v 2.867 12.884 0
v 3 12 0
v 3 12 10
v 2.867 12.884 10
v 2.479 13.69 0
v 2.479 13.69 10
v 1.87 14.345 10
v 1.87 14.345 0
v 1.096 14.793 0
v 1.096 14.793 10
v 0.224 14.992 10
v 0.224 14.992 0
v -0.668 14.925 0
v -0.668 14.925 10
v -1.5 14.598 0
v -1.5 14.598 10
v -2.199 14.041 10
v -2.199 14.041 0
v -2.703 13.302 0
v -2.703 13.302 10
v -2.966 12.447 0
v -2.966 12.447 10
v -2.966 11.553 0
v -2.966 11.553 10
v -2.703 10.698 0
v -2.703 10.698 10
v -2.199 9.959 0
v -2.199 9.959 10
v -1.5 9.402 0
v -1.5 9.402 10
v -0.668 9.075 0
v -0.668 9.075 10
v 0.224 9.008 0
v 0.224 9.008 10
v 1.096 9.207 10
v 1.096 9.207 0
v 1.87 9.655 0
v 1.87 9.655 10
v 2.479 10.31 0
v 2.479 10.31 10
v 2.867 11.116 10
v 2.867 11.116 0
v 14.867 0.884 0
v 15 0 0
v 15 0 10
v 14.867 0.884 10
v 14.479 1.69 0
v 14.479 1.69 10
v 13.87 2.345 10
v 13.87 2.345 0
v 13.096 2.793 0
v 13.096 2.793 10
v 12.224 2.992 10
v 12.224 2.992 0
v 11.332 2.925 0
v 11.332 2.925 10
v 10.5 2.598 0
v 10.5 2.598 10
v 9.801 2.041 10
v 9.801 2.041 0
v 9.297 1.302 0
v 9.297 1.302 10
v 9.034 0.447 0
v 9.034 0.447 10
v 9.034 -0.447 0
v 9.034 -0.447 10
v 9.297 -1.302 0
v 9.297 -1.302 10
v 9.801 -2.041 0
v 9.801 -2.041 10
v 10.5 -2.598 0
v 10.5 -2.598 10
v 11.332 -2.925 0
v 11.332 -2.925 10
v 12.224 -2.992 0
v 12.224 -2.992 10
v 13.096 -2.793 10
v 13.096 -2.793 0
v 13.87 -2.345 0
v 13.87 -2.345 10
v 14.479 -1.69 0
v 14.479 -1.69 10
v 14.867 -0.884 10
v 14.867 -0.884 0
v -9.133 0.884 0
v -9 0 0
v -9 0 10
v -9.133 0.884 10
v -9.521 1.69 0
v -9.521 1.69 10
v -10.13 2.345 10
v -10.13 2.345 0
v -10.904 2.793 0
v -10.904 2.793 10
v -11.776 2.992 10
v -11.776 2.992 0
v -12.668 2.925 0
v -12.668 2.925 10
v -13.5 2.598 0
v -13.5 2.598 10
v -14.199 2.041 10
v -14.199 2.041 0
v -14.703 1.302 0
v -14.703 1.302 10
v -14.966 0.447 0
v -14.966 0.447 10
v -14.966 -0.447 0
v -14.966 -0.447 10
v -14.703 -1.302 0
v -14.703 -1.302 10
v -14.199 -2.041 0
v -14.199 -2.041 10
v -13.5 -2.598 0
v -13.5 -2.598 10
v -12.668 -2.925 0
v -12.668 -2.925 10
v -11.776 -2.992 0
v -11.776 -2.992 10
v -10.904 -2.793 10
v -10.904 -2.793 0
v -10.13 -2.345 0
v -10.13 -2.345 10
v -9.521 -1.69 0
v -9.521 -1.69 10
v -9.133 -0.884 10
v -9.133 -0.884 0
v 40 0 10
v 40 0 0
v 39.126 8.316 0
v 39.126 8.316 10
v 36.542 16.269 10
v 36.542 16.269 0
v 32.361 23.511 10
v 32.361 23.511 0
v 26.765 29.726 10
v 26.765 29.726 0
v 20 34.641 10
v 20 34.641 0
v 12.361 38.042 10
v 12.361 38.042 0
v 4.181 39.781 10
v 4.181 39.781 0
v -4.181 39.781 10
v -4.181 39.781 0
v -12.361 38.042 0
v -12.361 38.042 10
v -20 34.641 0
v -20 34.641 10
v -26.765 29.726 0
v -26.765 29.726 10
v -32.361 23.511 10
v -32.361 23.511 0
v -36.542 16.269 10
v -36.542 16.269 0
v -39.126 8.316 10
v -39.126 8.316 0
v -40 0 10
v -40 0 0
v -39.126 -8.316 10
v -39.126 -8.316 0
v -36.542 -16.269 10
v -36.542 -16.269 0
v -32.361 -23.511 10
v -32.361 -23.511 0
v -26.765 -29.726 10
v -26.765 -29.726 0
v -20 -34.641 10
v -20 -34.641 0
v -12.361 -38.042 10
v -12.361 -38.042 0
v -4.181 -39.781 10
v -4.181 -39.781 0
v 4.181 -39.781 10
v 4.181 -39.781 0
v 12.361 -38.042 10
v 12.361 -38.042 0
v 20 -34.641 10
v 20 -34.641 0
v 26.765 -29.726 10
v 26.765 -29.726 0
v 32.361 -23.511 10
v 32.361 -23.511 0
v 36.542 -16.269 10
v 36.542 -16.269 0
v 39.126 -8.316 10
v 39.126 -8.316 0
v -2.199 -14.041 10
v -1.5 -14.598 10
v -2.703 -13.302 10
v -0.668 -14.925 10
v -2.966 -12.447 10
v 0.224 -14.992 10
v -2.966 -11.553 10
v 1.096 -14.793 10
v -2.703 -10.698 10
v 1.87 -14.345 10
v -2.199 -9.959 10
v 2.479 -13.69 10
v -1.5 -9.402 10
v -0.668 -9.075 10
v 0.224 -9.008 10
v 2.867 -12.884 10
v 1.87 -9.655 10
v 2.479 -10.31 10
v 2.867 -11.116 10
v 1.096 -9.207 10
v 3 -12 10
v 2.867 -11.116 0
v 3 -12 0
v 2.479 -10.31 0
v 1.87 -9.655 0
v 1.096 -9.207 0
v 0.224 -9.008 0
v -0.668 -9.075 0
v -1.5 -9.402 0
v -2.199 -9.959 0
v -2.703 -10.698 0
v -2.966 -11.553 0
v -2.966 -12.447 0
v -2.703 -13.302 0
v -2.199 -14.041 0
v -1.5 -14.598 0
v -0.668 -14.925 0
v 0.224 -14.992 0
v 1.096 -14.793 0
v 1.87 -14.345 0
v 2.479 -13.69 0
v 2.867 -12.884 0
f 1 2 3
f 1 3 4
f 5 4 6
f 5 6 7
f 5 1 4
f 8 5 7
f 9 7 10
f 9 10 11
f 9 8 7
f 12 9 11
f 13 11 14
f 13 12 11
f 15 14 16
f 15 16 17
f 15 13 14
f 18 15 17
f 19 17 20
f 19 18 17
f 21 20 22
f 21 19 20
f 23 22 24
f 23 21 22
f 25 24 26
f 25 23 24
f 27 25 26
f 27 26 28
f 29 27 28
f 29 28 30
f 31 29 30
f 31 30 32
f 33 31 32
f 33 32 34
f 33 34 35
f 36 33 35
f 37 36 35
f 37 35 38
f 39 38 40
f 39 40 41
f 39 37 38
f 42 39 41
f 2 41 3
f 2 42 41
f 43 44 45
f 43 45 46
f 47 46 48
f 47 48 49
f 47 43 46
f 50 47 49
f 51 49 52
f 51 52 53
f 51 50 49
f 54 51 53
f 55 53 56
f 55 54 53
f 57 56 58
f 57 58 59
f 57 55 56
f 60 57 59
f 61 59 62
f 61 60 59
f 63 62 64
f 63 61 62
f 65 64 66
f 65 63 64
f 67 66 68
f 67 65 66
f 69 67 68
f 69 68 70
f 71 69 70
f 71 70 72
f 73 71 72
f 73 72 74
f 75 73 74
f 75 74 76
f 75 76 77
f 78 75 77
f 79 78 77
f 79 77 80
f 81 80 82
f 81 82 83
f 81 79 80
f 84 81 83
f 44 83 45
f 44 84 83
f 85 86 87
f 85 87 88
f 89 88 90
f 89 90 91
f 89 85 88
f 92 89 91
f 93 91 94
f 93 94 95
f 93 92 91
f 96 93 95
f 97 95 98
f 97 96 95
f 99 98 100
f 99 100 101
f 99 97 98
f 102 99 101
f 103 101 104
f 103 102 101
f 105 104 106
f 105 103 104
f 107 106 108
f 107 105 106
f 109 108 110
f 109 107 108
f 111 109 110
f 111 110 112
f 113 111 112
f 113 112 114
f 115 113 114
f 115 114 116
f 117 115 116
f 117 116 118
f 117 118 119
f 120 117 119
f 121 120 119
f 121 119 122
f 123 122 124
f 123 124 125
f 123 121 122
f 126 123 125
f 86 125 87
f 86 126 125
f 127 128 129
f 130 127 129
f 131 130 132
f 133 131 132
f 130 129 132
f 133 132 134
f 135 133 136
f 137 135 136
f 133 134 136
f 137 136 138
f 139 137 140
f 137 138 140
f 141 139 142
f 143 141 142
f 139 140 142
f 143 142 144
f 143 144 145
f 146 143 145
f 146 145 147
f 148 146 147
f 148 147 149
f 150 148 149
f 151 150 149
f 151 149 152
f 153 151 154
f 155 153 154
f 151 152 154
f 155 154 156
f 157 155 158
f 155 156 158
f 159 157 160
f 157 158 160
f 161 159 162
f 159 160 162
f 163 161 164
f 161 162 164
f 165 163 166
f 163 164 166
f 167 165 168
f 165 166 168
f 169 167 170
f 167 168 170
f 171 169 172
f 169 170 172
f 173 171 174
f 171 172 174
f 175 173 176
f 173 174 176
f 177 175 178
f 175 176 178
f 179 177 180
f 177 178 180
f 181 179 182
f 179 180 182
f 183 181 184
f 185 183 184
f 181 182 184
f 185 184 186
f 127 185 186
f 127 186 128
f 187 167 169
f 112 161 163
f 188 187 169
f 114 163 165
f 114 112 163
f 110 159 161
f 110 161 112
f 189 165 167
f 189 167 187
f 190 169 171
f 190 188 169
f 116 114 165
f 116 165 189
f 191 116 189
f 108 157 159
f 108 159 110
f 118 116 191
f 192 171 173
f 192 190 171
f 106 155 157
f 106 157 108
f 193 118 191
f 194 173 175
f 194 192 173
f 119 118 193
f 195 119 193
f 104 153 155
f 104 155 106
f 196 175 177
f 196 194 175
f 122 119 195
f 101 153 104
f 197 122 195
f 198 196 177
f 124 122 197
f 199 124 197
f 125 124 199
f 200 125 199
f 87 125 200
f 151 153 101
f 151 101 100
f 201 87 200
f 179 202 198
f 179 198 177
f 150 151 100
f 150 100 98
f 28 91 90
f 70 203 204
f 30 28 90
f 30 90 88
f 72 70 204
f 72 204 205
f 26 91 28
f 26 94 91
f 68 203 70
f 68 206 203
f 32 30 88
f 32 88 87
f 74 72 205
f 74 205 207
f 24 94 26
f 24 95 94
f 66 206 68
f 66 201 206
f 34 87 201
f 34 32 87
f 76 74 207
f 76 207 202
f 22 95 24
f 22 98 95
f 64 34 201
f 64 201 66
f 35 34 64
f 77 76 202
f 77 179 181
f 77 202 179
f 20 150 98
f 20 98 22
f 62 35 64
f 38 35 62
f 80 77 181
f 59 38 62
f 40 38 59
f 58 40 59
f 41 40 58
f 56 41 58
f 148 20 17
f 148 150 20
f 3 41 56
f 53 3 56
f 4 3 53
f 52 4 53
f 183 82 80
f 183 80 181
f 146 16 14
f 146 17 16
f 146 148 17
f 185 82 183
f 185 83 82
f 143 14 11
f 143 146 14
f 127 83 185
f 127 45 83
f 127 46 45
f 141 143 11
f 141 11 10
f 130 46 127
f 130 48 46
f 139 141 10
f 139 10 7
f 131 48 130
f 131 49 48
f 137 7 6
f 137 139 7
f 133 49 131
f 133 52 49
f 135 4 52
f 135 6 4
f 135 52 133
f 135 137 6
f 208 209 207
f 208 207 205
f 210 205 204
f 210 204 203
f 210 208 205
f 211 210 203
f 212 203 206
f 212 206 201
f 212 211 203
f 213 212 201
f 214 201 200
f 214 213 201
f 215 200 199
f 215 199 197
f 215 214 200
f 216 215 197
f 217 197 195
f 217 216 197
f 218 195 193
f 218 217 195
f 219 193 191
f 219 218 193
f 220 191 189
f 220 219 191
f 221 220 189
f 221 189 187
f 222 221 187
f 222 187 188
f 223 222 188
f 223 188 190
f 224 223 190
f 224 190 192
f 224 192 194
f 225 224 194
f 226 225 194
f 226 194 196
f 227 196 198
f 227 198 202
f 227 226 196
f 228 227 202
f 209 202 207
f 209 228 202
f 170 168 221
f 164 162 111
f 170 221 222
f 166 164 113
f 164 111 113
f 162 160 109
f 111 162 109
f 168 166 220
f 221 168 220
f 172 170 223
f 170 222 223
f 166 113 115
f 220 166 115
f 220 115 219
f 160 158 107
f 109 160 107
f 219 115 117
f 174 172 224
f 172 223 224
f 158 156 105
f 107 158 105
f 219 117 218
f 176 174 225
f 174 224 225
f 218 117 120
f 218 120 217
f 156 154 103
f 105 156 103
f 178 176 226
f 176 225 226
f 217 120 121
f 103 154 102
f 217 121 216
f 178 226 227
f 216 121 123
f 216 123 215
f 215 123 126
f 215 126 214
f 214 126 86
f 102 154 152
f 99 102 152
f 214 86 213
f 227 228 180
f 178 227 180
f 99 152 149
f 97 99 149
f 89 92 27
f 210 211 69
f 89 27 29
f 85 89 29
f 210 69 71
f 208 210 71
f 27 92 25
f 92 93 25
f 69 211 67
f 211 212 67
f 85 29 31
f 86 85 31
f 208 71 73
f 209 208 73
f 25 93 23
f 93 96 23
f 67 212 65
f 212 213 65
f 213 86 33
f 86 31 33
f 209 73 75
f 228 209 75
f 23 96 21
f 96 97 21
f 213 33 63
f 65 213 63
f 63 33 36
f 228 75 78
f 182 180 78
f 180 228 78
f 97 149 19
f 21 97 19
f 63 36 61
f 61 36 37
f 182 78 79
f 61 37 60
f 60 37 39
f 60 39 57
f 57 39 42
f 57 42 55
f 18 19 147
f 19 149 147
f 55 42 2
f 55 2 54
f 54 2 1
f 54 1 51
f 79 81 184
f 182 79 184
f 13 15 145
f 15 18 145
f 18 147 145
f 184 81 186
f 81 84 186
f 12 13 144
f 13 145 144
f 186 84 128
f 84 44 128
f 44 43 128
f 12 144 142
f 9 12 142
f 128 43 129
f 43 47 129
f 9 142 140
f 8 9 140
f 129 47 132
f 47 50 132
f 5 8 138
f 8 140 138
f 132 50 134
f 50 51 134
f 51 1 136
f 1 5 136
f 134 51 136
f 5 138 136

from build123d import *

# Parameters (mm, degrees)
SKETCH_1_R      = 17.5
SKETCH_1_R_2    = 3
EXTRUDE_1_DEPTH = 10
EXTRUDE_START   = -10
SKETCH_2_R      = 40
SKETCH_2_R_2    = 17.5
EXTRUDE_3_DEPTH = 10


with BuildPart() as part:
    # 草图1 → 凸台-拉伸1 (new body)
    with BuildSketch(Plane.XY):
        Circle(SKETCH_1_R)
        with Locations((-12, 0)):
            Circle(SKETCH_1_R_2, mode=Mode.SUBTRACT)
        with Locations((0, 12)):
            Circle(SKETCH_1_R_2, mode=Mode.SUBTRACT)
        with Locations((12, 0)):
            Circle(SKETCH_1_R_2, mode=Mode.SUBTRACT)
        with Locations((0, -12)):
            Circle(SKETCH_1_R_2, mode=Mode.SUBTRACT)
    extrude(amount=EXTRUDE_1_DEPTH)

    # 草图2 → 凸台-拉伸3 (add)
    with BuildSketch(Plane.XY.offset(10).offset(EXTRUDE_START)):
        Circle(SKETCH_2_R)
        Circle(SKETCH_2_R_2, mode=Mode.SUBTRACT)
    extrude(amount=EXTRUDE_3_DEPTH)


solid = part.part
